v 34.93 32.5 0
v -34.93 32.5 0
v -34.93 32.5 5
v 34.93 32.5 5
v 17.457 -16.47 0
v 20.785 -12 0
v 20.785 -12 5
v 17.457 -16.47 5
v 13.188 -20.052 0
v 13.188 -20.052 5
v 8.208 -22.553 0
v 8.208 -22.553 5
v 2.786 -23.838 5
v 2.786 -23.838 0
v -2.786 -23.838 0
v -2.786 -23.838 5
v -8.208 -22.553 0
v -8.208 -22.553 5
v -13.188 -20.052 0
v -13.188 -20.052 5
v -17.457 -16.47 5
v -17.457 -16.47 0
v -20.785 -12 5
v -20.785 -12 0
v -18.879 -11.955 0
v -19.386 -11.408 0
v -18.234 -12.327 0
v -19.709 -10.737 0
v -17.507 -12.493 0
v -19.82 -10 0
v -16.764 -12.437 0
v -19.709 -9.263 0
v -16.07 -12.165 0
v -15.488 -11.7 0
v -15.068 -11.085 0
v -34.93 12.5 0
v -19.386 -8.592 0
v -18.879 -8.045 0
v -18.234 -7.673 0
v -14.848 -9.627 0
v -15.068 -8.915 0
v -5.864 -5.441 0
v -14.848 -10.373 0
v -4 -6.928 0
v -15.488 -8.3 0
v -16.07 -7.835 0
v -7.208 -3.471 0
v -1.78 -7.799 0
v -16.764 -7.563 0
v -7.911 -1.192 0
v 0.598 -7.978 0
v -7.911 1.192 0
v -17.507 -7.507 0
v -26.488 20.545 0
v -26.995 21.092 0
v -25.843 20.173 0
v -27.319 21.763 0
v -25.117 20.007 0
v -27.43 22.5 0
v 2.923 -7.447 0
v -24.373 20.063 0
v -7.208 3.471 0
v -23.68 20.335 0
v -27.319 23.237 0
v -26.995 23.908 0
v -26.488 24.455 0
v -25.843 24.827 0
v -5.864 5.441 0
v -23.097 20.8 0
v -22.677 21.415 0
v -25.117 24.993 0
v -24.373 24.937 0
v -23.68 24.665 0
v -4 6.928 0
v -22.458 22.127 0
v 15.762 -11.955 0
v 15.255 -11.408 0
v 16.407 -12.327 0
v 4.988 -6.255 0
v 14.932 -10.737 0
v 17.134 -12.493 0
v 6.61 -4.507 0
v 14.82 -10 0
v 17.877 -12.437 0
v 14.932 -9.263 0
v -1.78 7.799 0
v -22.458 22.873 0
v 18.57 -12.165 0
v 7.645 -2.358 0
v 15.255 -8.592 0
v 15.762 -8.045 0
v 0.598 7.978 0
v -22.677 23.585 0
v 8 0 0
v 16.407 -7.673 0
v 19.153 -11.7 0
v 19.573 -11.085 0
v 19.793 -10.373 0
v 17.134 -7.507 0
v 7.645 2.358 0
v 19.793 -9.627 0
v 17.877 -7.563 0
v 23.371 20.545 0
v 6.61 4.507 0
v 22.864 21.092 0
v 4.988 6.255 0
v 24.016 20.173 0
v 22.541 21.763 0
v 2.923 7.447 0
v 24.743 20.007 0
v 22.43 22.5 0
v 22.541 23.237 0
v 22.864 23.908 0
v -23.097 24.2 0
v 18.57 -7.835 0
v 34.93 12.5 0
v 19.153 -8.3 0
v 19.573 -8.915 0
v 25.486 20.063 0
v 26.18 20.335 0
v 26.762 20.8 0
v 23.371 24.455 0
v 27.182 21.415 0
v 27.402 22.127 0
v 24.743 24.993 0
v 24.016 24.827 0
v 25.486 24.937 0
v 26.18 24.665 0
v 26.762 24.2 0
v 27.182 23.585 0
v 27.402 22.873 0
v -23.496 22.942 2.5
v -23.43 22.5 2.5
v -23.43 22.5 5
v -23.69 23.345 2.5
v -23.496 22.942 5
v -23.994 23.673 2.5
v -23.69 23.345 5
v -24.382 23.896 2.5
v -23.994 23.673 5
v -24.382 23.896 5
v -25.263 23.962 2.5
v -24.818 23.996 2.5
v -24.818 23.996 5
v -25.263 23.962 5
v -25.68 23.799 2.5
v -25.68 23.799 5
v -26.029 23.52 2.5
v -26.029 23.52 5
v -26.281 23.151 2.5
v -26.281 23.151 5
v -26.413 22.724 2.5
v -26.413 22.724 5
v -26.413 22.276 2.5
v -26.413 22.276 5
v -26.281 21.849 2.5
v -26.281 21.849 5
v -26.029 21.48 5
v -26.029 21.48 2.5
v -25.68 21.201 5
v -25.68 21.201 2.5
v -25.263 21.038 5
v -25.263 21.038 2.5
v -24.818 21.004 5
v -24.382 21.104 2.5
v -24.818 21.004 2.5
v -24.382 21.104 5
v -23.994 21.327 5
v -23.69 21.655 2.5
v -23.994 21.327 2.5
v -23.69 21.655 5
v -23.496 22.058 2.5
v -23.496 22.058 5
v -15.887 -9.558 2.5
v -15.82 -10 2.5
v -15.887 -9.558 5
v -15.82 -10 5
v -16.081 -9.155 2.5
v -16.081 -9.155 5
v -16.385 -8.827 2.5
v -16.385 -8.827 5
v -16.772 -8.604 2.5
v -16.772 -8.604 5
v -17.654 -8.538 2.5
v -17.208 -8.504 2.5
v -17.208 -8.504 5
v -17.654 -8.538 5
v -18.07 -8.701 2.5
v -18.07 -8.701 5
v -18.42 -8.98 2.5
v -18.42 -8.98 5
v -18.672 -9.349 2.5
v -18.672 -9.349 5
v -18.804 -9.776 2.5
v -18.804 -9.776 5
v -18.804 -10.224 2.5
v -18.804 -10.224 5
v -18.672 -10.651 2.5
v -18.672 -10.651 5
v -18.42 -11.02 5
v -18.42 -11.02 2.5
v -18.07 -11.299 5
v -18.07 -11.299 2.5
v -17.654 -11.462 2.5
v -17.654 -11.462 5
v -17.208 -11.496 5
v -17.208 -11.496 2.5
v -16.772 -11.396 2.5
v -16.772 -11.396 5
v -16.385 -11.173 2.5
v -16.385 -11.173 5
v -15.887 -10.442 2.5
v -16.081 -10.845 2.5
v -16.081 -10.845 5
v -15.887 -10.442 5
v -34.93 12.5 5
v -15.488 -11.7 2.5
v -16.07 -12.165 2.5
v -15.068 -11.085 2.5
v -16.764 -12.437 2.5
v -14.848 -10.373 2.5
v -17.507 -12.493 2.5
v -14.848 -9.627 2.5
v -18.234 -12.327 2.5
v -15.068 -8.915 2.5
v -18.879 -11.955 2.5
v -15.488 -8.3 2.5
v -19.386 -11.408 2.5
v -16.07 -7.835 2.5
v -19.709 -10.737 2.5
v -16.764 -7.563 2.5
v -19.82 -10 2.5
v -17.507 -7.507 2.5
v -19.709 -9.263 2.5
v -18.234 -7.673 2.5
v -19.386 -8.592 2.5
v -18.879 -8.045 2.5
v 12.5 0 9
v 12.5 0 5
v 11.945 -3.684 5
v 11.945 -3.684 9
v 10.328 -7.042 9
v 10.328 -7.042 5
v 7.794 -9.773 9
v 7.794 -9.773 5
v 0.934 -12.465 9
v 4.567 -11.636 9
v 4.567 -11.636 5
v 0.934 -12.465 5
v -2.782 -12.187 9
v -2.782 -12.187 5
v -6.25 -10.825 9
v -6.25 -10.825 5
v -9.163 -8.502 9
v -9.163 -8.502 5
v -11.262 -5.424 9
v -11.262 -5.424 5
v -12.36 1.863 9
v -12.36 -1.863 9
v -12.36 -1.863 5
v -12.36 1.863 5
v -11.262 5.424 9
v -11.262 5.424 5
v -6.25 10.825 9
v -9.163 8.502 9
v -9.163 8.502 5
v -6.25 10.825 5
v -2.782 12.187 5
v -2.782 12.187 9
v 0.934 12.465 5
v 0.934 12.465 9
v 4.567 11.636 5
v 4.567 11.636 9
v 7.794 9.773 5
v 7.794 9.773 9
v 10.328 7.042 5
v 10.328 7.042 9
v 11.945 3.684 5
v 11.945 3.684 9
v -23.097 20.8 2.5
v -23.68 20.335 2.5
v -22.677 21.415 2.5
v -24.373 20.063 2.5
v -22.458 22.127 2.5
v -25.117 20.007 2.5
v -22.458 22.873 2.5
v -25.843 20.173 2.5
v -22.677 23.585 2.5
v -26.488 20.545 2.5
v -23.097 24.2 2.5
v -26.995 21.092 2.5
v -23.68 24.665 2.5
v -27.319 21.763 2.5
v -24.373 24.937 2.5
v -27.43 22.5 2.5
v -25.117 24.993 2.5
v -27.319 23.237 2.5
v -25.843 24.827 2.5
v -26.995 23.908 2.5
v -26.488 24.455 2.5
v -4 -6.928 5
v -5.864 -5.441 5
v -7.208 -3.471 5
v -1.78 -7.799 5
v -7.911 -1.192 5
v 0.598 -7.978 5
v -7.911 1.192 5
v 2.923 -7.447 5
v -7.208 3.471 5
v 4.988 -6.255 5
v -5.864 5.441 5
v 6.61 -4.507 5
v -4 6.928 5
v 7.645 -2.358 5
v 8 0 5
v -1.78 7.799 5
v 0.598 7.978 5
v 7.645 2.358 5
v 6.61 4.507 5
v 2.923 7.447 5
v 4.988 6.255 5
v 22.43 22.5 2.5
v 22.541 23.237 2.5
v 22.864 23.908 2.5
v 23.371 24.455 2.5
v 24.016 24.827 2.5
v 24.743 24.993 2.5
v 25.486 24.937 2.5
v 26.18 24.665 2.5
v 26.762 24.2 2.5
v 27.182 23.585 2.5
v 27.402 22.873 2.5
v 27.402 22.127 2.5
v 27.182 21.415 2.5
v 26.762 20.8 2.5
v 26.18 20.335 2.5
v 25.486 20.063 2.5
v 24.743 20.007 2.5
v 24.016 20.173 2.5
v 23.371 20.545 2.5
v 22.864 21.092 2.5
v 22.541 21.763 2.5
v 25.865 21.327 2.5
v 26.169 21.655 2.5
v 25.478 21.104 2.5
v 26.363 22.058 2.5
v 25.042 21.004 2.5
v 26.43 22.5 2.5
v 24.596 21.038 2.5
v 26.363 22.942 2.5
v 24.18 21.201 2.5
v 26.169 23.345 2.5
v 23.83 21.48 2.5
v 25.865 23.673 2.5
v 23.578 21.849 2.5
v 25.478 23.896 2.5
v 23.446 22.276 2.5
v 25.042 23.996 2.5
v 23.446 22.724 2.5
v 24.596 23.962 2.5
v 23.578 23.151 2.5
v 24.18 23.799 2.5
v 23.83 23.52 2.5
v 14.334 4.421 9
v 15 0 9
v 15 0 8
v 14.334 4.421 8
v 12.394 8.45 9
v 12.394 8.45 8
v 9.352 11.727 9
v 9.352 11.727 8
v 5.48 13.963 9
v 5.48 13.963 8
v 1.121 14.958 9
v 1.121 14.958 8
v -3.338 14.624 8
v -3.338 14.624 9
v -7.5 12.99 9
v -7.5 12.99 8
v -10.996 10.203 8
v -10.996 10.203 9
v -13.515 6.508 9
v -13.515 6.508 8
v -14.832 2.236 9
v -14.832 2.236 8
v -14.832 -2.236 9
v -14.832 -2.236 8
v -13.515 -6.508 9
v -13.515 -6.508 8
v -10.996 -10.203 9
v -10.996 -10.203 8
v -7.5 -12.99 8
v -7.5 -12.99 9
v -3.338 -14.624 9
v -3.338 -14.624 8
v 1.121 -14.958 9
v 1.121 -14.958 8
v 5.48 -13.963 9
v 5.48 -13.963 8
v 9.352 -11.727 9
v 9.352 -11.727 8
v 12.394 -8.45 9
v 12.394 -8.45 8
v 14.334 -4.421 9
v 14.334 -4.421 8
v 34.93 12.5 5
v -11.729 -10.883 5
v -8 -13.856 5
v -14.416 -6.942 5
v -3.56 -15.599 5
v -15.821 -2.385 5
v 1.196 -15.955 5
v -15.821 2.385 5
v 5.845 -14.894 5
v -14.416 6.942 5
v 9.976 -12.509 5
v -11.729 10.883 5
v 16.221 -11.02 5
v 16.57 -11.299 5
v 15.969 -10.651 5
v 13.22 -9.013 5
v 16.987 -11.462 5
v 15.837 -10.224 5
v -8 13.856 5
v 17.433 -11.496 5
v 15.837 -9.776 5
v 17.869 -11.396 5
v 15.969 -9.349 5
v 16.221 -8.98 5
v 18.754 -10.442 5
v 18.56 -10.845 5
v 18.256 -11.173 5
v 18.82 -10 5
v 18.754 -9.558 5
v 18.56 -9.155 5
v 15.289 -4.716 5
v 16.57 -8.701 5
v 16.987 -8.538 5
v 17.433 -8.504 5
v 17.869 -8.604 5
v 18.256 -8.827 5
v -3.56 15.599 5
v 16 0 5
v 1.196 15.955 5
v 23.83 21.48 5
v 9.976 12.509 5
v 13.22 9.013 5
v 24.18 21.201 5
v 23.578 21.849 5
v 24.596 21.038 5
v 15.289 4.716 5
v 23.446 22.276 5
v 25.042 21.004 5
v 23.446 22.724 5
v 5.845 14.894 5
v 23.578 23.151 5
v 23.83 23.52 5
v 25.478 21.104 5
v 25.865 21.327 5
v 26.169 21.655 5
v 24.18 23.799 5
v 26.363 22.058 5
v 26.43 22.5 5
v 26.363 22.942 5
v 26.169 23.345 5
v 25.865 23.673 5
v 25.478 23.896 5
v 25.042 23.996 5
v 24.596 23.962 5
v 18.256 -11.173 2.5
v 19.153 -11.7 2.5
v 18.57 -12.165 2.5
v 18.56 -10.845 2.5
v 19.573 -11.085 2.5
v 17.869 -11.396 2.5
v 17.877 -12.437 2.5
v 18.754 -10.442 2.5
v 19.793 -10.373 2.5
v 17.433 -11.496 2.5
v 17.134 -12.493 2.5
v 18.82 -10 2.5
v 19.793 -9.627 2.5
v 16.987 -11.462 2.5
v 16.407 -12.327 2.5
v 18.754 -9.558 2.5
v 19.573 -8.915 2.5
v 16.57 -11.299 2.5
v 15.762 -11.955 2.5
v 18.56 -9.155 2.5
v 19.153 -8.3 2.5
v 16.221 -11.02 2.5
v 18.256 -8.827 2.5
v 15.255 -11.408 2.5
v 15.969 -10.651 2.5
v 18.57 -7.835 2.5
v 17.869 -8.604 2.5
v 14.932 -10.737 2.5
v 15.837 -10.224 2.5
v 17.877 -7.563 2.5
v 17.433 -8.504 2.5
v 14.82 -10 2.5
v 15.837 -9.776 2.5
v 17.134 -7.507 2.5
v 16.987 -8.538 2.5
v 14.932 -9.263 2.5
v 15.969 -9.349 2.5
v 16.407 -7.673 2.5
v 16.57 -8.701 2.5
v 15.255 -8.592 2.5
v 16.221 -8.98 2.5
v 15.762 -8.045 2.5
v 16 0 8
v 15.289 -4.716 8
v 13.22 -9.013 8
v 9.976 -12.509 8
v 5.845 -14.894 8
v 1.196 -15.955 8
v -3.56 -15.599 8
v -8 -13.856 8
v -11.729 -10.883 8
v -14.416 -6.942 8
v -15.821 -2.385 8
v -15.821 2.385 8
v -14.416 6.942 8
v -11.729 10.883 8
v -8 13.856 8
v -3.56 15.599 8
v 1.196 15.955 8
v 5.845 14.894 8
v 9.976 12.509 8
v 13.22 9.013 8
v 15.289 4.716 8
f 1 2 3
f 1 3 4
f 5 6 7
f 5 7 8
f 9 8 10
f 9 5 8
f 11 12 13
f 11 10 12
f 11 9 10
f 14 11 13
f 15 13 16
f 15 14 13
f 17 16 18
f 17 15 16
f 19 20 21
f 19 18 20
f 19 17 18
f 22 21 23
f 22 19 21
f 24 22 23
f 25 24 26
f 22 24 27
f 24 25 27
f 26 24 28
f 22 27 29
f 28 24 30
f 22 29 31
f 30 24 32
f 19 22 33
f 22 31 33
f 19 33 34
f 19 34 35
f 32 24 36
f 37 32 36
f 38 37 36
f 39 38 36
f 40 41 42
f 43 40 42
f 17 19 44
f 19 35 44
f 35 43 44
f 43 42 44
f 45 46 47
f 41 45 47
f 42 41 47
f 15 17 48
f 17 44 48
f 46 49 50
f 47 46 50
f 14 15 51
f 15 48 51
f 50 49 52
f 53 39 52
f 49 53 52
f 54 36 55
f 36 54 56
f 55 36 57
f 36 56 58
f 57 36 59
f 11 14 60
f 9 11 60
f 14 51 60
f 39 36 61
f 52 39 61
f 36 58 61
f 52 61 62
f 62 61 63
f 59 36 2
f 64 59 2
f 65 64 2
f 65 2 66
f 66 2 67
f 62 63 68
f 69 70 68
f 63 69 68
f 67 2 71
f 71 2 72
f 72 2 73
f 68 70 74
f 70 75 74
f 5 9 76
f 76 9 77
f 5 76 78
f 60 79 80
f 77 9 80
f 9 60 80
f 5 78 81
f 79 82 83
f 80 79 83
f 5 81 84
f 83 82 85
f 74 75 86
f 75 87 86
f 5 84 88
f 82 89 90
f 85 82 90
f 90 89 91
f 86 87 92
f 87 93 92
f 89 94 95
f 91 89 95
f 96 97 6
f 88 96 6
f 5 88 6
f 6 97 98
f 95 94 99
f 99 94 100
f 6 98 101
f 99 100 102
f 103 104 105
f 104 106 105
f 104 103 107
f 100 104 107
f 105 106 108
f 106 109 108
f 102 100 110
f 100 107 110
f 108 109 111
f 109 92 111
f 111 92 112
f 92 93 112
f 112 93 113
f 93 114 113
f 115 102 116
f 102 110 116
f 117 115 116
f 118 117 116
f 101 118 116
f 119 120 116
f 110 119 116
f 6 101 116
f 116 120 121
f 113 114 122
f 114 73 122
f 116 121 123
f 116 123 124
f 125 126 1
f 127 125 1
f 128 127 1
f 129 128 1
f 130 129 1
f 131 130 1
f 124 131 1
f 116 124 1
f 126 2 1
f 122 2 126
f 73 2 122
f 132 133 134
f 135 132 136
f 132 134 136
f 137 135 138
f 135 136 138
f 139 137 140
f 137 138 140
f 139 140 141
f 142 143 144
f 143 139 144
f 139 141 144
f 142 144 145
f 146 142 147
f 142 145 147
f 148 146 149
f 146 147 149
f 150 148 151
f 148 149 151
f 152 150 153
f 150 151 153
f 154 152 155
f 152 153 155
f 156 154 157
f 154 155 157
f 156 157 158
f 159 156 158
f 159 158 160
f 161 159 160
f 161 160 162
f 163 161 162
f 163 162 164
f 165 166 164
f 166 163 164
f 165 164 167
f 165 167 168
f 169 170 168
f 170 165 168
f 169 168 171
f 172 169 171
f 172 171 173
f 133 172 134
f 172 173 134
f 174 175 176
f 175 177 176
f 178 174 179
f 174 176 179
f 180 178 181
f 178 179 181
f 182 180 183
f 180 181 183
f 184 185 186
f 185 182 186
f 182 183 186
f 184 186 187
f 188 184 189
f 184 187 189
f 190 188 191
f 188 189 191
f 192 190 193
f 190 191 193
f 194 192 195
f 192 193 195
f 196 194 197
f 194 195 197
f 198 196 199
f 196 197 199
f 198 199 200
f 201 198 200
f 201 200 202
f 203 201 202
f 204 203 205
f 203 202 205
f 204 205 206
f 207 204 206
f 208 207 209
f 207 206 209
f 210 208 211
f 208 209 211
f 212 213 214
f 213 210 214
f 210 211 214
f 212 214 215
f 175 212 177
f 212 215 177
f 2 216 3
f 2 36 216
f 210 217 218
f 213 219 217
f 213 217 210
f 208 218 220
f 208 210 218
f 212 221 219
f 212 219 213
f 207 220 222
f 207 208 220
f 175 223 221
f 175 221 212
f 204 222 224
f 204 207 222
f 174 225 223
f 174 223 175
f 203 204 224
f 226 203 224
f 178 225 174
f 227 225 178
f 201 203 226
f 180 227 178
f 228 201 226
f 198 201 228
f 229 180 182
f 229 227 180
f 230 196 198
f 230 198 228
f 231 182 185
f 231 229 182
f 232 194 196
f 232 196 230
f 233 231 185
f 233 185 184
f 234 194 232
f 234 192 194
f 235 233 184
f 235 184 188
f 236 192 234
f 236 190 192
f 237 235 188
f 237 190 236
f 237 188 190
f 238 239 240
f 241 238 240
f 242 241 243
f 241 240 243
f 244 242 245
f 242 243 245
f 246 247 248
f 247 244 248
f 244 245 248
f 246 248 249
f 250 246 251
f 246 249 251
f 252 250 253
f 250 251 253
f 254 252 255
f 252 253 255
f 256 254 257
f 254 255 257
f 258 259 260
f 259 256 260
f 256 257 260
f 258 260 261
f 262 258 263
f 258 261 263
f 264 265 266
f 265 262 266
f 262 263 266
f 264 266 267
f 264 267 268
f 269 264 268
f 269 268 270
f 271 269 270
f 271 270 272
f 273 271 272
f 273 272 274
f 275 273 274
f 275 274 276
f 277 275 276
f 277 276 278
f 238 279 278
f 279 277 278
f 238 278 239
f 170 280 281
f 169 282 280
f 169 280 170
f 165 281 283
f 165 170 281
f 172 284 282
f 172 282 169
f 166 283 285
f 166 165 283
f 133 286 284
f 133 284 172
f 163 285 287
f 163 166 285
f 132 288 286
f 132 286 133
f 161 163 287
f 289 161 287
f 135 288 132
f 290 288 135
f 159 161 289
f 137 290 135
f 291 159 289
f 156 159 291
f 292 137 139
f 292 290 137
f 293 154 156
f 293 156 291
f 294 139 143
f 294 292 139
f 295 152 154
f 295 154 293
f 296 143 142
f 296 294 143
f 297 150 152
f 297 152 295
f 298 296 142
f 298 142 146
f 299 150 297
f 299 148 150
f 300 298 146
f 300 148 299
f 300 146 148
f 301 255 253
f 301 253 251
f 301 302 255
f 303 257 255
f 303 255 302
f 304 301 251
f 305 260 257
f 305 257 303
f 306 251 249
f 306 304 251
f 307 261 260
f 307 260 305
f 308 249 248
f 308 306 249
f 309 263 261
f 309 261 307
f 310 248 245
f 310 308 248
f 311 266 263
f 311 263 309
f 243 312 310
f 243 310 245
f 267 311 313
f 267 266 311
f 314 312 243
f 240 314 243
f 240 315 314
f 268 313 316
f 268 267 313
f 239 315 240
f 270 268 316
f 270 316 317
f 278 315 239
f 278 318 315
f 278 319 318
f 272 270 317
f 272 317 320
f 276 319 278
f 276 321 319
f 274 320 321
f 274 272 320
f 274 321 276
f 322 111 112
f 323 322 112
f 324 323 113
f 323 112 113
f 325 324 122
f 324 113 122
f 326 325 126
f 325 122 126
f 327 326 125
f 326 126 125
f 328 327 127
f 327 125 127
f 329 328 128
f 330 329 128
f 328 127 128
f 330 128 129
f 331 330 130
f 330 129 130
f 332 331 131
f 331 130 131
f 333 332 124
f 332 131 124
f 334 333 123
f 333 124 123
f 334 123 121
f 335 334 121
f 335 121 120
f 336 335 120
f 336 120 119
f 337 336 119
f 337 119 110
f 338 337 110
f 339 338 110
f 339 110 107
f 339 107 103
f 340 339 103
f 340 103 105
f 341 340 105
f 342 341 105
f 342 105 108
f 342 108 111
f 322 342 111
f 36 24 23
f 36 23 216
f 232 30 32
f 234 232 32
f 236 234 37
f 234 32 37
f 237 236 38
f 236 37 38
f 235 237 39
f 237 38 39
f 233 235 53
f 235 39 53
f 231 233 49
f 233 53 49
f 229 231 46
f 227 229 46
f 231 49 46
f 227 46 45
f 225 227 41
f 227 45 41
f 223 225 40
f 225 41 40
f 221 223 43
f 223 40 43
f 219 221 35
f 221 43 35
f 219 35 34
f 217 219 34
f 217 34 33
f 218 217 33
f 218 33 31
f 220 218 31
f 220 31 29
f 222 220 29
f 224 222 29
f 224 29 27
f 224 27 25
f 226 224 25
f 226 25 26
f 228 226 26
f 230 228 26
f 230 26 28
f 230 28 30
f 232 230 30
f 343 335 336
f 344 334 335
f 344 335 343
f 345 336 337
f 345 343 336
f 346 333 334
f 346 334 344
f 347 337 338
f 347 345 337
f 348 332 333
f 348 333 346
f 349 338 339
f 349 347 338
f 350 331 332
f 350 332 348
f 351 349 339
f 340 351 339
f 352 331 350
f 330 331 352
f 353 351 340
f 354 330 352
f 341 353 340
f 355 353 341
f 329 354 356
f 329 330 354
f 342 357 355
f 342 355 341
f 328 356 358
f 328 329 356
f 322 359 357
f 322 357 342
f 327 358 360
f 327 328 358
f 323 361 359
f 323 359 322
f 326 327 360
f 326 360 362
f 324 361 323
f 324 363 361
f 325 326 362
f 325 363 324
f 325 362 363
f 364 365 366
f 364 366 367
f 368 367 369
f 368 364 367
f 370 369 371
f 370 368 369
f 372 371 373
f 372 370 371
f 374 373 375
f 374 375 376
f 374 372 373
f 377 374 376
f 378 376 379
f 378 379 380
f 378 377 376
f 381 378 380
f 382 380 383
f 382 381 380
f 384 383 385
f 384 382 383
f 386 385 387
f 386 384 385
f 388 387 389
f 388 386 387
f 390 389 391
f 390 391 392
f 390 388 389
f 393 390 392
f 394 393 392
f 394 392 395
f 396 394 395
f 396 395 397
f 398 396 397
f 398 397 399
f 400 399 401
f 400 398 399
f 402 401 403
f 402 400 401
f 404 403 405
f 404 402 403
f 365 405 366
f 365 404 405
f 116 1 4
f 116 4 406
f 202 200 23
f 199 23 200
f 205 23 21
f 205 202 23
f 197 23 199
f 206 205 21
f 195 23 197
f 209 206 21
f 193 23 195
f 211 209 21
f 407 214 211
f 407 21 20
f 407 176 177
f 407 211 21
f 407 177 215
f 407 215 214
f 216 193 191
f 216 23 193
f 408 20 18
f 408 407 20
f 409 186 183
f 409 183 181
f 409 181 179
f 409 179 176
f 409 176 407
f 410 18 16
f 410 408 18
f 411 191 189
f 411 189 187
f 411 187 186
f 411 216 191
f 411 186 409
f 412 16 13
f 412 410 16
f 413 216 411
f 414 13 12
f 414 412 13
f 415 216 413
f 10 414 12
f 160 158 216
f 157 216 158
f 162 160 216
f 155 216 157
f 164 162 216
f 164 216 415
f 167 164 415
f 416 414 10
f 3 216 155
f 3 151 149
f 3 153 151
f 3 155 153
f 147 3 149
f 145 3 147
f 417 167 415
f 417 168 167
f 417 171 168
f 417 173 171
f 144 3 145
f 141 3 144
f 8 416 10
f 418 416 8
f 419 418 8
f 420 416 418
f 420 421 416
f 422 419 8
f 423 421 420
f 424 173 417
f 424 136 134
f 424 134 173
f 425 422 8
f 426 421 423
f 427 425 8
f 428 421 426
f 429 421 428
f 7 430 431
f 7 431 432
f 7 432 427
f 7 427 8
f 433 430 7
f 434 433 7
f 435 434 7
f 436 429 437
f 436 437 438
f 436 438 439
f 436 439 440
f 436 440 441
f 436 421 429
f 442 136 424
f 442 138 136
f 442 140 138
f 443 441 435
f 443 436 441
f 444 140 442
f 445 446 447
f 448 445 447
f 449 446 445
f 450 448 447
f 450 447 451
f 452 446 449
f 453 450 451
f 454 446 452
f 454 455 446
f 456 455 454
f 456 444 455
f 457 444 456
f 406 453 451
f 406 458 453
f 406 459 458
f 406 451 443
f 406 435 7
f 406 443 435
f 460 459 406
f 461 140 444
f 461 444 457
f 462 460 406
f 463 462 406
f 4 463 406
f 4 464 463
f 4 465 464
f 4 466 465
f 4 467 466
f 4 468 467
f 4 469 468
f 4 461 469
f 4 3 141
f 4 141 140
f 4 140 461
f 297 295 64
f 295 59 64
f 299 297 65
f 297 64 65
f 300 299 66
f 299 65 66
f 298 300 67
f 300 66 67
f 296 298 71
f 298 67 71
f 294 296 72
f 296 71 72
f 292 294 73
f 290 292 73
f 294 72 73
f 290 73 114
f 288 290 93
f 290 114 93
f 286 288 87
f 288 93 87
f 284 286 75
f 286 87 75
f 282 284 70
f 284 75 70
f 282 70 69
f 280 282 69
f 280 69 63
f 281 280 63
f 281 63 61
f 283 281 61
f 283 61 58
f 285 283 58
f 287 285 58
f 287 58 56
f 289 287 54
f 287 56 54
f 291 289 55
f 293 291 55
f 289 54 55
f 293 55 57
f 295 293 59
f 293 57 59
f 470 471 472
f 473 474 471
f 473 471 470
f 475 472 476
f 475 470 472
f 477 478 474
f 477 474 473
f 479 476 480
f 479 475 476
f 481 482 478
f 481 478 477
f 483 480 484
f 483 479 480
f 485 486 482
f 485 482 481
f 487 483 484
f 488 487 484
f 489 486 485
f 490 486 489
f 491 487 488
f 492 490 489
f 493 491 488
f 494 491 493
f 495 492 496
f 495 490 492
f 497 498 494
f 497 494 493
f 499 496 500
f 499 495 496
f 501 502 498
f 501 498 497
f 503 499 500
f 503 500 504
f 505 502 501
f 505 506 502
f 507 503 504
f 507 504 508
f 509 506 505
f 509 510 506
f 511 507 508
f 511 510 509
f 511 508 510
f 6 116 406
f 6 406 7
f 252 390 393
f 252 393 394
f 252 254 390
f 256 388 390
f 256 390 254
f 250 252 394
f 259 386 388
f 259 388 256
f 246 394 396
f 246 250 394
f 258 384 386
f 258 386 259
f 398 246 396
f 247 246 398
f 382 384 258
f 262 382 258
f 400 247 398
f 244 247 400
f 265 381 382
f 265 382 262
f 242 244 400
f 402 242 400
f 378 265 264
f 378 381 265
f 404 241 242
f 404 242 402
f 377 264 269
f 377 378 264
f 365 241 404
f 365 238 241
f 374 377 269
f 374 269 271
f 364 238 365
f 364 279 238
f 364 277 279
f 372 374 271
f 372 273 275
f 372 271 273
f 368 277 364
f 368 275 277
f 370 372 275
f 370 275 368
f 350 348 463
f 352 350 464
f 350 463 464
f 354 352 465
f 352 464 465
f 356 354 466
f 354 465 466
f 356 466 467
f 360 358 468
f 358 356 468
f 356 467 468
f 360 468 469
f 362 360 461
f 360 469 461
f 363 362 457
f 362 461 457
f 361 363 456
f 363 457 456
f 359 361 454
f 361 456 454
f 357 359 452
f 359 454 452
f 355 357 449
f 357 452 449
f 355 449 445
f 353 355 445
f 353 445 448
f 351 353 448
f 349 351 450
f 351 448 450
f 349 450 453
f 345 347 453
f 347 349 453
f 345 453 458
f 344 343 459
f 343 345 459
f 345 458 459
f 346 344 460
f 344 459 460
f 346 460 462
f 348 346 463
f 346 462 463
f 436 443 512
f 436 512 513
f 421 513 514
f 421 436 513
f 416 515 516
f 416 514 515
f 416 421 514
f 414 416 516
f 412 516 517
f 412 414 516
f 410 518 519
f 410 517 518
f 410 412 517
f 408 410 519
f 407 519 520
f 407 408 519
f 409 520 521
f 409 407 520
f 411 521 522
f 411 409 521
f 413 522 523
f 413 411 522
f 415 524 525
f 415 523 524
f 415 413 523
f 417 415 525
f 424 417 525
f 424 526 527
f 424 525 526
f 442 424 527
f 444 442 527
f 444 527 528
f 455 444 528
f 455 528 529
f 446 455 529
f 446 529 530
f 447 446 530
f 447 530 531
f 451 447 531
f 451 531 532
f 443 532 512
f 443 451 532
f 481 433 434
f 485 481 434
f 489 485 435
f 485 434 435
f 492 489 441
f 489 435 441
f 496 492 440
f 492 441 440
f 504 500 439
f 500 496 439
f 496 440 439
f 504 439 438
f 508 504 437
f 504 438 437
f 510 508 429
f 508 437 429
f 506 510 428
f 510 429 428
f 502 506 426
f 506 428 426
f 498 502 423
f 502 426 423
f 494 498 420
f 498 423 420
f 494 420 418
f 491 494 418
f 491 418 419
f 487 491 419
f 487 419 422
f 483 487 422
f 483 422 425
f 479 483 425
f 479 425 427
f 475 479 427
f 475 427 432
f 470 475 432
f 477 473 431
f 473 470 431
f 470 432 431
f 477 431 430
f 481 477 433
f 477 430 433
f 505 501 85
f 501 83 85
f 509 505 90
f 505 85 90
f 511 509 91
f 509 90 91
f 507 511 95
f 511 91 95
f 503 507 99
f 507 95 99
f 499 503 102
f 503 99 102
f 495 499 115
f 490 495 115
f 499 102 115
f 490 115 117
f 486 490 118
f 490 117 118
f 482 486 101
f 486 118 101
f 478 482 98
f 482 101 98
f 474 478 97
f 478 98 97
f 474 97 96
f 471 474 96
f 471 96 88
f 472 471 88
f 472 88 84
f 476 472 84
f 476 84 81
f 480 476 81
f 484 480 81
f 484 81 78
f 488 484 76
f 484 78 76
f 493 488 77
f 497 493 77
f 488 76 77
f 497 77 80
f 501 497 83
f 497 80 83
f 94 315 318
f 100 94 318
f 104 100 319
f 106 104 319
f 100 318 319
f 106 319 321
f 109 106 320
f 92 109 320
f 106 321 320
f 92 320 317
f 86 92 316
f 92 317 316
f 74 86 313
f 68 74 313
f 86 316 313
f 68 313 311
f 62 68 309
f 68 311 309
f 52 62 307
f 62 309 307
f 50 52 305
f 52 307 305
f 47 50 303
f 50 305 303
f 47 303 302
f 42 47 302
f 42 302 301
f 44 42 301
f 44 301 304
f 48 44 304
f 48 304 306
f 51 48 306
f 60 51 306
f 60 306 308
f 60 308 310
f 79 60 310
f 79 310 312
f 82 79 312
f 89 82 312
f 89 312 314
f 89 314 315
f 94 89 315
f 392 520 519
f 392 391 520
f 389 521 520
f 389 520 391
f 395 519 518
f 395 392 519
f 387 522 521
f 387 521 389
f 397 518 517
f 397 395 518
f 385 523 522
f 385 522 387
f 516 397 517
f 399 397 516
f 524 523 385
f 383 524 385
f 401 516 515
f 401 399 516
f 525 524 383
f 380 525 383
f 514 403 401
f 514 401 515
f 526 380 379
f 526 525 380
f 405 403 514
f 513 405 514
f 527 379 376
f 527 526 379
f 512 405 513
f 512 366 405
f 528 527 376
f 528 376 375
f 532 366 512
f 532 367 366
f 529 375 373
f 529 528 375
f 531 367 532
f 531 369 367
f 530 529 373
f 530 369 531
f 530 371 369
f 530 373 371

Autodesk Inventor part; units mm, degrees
ref_plane "YZ Plane" through (0, 0, 0) normal (1, 0, 0) x (0, 1, 0)
ref_plane "XZ Plane" through (0, 0, 0) normal (0, 1, 0) x (-1, 0, 0)
ref_plane "XY Plane" through (0, 0, 0) normal (0, 0, 1) x (1, 0, 0)
sketch "草图1" plane through (0, 0, 0) normal (0, 0, 1) x (1, 0, 0)
  circle A0 centre (0, 0) radius 24
  line L0 (-20.7846, -12) -> (-34.9297, 12.5)
  line L1 (-34.9297, 12.5) -> (-34.9297, 32.5)
  line L2 (-34.9297, 32.5) -> (34.9297, 32.5)
  line L3 (34.9297, 32.5) -> (34.9297, 12.5)
  line L4 (34.9297, 12.5) -> (20.7846, -12)
  line L5 (0, 0) -> (0, 15.9109)
  dimension "d0" = 48
  dimension "d1" = 15.9109
  dimension "d2" = 12.5
  dimension "d3" = 20
  dimension "d4" = 150
extrude "拉伸1" add sketch "草图1" along normal blind 5
sketch "草图2" plane through (0, 0, 5) normal (0, 0, 1) x (1, 0, 0)
  circle A0 centre (0, 0) radius 16
  circle A1 centre (0, 0) radius 12.5
  dimension "d7" = 32
  dimension "d8" = 25
extrude "拉伸2" add sketch "草图2" along normal blind 4
sketch "草图3" plane through (0, 0, 9) normal (0, 0, 1) x (1, 0, 0)
  circle A0 centre (0, 0) radius 16
  circle A1 centre (0, 0) radius 15
  dimension "d11" = 32
  dimension "d12" = 30
extrude "拉伸3" cut sketch "草图3" against normal blind 1
sketch "草图4" plane through (0, 0, 5) normal (0, 0, 1) x (1, 0, 0)
  circle A0 centre (0, 0) radius 8
  dimension "d15" = 16
extrude "拉伸4" cut sketch "草图4" against normal through all
sketch "草图5" plane through (0, 0, 5) normal (0, 0, 1) x (1, 0, 0)
  circle A0 centre (17.3205, -10) radius 1.5
  circle A1 centre (-17.3205, -10) radius 1.5
  circle A2 centre (24.9297, 22.5) radius 1.5
  circle A3 centre (-24.9297, 22.5) radius 1.5
  line L0 (-34.9297, 32.5) -> (-34.9297, 12.5) projected
  line L1 (34.9297, 32.5) -> (-34.9297, 32.5) projected
  line L2 (34.9297, 12.5) -> (34.9297, 32.5) projected
  arc A4 (-17.3205, -10) -> (17.3205, -10) centre (0, 0) ccw
  dimension "d18" = 3
  dimension "d19" = 3
  dimension "d20" = 3
  dimension "d21" = 3
  dimension "d22" = 10
  dimension "d23" = 10
  dimension "d24" = 10
  dimension "d25" = 10
  dimension "d26" = 10
  dimension "d27" = 20
  dimension "d28" = 10
extrude "拉伸5" cut sketch "草图5" against normal through all
sketch "草图6" plane through (0, 0, 0) normal (0, 0, -1) x (-1, 0, 0)
  circle A0 centre (17.3205, -10) radius 2.5
  circle A1 centre (-17.3205, -10) radius 2.5
  circle A2 centre (24.9297, 22.5) radius 2.5
  circle A3 centre (-24.9297, 22.5) radius 2.5
  circle A4 centre (17.3205, -10) radius 1.5 projected
  circle A5 centre (-17.3205, -10) radius 1.5 projected
  circle A6 centre (-24.9297, 22.5) radius 1.5 projected
  circle A7 centre (24.9297, 22.5) radius 1.5 projected
  point P0 (0, 0)
  dimension "d31" = 5
  dimension "d32" = 5
  dimension "d33" = 5
  dimension "d34" = 5
extrude "拉伸6" cut sketch "草图6" against normal blind 2.5
properties part number "砂轮轴端盖"
